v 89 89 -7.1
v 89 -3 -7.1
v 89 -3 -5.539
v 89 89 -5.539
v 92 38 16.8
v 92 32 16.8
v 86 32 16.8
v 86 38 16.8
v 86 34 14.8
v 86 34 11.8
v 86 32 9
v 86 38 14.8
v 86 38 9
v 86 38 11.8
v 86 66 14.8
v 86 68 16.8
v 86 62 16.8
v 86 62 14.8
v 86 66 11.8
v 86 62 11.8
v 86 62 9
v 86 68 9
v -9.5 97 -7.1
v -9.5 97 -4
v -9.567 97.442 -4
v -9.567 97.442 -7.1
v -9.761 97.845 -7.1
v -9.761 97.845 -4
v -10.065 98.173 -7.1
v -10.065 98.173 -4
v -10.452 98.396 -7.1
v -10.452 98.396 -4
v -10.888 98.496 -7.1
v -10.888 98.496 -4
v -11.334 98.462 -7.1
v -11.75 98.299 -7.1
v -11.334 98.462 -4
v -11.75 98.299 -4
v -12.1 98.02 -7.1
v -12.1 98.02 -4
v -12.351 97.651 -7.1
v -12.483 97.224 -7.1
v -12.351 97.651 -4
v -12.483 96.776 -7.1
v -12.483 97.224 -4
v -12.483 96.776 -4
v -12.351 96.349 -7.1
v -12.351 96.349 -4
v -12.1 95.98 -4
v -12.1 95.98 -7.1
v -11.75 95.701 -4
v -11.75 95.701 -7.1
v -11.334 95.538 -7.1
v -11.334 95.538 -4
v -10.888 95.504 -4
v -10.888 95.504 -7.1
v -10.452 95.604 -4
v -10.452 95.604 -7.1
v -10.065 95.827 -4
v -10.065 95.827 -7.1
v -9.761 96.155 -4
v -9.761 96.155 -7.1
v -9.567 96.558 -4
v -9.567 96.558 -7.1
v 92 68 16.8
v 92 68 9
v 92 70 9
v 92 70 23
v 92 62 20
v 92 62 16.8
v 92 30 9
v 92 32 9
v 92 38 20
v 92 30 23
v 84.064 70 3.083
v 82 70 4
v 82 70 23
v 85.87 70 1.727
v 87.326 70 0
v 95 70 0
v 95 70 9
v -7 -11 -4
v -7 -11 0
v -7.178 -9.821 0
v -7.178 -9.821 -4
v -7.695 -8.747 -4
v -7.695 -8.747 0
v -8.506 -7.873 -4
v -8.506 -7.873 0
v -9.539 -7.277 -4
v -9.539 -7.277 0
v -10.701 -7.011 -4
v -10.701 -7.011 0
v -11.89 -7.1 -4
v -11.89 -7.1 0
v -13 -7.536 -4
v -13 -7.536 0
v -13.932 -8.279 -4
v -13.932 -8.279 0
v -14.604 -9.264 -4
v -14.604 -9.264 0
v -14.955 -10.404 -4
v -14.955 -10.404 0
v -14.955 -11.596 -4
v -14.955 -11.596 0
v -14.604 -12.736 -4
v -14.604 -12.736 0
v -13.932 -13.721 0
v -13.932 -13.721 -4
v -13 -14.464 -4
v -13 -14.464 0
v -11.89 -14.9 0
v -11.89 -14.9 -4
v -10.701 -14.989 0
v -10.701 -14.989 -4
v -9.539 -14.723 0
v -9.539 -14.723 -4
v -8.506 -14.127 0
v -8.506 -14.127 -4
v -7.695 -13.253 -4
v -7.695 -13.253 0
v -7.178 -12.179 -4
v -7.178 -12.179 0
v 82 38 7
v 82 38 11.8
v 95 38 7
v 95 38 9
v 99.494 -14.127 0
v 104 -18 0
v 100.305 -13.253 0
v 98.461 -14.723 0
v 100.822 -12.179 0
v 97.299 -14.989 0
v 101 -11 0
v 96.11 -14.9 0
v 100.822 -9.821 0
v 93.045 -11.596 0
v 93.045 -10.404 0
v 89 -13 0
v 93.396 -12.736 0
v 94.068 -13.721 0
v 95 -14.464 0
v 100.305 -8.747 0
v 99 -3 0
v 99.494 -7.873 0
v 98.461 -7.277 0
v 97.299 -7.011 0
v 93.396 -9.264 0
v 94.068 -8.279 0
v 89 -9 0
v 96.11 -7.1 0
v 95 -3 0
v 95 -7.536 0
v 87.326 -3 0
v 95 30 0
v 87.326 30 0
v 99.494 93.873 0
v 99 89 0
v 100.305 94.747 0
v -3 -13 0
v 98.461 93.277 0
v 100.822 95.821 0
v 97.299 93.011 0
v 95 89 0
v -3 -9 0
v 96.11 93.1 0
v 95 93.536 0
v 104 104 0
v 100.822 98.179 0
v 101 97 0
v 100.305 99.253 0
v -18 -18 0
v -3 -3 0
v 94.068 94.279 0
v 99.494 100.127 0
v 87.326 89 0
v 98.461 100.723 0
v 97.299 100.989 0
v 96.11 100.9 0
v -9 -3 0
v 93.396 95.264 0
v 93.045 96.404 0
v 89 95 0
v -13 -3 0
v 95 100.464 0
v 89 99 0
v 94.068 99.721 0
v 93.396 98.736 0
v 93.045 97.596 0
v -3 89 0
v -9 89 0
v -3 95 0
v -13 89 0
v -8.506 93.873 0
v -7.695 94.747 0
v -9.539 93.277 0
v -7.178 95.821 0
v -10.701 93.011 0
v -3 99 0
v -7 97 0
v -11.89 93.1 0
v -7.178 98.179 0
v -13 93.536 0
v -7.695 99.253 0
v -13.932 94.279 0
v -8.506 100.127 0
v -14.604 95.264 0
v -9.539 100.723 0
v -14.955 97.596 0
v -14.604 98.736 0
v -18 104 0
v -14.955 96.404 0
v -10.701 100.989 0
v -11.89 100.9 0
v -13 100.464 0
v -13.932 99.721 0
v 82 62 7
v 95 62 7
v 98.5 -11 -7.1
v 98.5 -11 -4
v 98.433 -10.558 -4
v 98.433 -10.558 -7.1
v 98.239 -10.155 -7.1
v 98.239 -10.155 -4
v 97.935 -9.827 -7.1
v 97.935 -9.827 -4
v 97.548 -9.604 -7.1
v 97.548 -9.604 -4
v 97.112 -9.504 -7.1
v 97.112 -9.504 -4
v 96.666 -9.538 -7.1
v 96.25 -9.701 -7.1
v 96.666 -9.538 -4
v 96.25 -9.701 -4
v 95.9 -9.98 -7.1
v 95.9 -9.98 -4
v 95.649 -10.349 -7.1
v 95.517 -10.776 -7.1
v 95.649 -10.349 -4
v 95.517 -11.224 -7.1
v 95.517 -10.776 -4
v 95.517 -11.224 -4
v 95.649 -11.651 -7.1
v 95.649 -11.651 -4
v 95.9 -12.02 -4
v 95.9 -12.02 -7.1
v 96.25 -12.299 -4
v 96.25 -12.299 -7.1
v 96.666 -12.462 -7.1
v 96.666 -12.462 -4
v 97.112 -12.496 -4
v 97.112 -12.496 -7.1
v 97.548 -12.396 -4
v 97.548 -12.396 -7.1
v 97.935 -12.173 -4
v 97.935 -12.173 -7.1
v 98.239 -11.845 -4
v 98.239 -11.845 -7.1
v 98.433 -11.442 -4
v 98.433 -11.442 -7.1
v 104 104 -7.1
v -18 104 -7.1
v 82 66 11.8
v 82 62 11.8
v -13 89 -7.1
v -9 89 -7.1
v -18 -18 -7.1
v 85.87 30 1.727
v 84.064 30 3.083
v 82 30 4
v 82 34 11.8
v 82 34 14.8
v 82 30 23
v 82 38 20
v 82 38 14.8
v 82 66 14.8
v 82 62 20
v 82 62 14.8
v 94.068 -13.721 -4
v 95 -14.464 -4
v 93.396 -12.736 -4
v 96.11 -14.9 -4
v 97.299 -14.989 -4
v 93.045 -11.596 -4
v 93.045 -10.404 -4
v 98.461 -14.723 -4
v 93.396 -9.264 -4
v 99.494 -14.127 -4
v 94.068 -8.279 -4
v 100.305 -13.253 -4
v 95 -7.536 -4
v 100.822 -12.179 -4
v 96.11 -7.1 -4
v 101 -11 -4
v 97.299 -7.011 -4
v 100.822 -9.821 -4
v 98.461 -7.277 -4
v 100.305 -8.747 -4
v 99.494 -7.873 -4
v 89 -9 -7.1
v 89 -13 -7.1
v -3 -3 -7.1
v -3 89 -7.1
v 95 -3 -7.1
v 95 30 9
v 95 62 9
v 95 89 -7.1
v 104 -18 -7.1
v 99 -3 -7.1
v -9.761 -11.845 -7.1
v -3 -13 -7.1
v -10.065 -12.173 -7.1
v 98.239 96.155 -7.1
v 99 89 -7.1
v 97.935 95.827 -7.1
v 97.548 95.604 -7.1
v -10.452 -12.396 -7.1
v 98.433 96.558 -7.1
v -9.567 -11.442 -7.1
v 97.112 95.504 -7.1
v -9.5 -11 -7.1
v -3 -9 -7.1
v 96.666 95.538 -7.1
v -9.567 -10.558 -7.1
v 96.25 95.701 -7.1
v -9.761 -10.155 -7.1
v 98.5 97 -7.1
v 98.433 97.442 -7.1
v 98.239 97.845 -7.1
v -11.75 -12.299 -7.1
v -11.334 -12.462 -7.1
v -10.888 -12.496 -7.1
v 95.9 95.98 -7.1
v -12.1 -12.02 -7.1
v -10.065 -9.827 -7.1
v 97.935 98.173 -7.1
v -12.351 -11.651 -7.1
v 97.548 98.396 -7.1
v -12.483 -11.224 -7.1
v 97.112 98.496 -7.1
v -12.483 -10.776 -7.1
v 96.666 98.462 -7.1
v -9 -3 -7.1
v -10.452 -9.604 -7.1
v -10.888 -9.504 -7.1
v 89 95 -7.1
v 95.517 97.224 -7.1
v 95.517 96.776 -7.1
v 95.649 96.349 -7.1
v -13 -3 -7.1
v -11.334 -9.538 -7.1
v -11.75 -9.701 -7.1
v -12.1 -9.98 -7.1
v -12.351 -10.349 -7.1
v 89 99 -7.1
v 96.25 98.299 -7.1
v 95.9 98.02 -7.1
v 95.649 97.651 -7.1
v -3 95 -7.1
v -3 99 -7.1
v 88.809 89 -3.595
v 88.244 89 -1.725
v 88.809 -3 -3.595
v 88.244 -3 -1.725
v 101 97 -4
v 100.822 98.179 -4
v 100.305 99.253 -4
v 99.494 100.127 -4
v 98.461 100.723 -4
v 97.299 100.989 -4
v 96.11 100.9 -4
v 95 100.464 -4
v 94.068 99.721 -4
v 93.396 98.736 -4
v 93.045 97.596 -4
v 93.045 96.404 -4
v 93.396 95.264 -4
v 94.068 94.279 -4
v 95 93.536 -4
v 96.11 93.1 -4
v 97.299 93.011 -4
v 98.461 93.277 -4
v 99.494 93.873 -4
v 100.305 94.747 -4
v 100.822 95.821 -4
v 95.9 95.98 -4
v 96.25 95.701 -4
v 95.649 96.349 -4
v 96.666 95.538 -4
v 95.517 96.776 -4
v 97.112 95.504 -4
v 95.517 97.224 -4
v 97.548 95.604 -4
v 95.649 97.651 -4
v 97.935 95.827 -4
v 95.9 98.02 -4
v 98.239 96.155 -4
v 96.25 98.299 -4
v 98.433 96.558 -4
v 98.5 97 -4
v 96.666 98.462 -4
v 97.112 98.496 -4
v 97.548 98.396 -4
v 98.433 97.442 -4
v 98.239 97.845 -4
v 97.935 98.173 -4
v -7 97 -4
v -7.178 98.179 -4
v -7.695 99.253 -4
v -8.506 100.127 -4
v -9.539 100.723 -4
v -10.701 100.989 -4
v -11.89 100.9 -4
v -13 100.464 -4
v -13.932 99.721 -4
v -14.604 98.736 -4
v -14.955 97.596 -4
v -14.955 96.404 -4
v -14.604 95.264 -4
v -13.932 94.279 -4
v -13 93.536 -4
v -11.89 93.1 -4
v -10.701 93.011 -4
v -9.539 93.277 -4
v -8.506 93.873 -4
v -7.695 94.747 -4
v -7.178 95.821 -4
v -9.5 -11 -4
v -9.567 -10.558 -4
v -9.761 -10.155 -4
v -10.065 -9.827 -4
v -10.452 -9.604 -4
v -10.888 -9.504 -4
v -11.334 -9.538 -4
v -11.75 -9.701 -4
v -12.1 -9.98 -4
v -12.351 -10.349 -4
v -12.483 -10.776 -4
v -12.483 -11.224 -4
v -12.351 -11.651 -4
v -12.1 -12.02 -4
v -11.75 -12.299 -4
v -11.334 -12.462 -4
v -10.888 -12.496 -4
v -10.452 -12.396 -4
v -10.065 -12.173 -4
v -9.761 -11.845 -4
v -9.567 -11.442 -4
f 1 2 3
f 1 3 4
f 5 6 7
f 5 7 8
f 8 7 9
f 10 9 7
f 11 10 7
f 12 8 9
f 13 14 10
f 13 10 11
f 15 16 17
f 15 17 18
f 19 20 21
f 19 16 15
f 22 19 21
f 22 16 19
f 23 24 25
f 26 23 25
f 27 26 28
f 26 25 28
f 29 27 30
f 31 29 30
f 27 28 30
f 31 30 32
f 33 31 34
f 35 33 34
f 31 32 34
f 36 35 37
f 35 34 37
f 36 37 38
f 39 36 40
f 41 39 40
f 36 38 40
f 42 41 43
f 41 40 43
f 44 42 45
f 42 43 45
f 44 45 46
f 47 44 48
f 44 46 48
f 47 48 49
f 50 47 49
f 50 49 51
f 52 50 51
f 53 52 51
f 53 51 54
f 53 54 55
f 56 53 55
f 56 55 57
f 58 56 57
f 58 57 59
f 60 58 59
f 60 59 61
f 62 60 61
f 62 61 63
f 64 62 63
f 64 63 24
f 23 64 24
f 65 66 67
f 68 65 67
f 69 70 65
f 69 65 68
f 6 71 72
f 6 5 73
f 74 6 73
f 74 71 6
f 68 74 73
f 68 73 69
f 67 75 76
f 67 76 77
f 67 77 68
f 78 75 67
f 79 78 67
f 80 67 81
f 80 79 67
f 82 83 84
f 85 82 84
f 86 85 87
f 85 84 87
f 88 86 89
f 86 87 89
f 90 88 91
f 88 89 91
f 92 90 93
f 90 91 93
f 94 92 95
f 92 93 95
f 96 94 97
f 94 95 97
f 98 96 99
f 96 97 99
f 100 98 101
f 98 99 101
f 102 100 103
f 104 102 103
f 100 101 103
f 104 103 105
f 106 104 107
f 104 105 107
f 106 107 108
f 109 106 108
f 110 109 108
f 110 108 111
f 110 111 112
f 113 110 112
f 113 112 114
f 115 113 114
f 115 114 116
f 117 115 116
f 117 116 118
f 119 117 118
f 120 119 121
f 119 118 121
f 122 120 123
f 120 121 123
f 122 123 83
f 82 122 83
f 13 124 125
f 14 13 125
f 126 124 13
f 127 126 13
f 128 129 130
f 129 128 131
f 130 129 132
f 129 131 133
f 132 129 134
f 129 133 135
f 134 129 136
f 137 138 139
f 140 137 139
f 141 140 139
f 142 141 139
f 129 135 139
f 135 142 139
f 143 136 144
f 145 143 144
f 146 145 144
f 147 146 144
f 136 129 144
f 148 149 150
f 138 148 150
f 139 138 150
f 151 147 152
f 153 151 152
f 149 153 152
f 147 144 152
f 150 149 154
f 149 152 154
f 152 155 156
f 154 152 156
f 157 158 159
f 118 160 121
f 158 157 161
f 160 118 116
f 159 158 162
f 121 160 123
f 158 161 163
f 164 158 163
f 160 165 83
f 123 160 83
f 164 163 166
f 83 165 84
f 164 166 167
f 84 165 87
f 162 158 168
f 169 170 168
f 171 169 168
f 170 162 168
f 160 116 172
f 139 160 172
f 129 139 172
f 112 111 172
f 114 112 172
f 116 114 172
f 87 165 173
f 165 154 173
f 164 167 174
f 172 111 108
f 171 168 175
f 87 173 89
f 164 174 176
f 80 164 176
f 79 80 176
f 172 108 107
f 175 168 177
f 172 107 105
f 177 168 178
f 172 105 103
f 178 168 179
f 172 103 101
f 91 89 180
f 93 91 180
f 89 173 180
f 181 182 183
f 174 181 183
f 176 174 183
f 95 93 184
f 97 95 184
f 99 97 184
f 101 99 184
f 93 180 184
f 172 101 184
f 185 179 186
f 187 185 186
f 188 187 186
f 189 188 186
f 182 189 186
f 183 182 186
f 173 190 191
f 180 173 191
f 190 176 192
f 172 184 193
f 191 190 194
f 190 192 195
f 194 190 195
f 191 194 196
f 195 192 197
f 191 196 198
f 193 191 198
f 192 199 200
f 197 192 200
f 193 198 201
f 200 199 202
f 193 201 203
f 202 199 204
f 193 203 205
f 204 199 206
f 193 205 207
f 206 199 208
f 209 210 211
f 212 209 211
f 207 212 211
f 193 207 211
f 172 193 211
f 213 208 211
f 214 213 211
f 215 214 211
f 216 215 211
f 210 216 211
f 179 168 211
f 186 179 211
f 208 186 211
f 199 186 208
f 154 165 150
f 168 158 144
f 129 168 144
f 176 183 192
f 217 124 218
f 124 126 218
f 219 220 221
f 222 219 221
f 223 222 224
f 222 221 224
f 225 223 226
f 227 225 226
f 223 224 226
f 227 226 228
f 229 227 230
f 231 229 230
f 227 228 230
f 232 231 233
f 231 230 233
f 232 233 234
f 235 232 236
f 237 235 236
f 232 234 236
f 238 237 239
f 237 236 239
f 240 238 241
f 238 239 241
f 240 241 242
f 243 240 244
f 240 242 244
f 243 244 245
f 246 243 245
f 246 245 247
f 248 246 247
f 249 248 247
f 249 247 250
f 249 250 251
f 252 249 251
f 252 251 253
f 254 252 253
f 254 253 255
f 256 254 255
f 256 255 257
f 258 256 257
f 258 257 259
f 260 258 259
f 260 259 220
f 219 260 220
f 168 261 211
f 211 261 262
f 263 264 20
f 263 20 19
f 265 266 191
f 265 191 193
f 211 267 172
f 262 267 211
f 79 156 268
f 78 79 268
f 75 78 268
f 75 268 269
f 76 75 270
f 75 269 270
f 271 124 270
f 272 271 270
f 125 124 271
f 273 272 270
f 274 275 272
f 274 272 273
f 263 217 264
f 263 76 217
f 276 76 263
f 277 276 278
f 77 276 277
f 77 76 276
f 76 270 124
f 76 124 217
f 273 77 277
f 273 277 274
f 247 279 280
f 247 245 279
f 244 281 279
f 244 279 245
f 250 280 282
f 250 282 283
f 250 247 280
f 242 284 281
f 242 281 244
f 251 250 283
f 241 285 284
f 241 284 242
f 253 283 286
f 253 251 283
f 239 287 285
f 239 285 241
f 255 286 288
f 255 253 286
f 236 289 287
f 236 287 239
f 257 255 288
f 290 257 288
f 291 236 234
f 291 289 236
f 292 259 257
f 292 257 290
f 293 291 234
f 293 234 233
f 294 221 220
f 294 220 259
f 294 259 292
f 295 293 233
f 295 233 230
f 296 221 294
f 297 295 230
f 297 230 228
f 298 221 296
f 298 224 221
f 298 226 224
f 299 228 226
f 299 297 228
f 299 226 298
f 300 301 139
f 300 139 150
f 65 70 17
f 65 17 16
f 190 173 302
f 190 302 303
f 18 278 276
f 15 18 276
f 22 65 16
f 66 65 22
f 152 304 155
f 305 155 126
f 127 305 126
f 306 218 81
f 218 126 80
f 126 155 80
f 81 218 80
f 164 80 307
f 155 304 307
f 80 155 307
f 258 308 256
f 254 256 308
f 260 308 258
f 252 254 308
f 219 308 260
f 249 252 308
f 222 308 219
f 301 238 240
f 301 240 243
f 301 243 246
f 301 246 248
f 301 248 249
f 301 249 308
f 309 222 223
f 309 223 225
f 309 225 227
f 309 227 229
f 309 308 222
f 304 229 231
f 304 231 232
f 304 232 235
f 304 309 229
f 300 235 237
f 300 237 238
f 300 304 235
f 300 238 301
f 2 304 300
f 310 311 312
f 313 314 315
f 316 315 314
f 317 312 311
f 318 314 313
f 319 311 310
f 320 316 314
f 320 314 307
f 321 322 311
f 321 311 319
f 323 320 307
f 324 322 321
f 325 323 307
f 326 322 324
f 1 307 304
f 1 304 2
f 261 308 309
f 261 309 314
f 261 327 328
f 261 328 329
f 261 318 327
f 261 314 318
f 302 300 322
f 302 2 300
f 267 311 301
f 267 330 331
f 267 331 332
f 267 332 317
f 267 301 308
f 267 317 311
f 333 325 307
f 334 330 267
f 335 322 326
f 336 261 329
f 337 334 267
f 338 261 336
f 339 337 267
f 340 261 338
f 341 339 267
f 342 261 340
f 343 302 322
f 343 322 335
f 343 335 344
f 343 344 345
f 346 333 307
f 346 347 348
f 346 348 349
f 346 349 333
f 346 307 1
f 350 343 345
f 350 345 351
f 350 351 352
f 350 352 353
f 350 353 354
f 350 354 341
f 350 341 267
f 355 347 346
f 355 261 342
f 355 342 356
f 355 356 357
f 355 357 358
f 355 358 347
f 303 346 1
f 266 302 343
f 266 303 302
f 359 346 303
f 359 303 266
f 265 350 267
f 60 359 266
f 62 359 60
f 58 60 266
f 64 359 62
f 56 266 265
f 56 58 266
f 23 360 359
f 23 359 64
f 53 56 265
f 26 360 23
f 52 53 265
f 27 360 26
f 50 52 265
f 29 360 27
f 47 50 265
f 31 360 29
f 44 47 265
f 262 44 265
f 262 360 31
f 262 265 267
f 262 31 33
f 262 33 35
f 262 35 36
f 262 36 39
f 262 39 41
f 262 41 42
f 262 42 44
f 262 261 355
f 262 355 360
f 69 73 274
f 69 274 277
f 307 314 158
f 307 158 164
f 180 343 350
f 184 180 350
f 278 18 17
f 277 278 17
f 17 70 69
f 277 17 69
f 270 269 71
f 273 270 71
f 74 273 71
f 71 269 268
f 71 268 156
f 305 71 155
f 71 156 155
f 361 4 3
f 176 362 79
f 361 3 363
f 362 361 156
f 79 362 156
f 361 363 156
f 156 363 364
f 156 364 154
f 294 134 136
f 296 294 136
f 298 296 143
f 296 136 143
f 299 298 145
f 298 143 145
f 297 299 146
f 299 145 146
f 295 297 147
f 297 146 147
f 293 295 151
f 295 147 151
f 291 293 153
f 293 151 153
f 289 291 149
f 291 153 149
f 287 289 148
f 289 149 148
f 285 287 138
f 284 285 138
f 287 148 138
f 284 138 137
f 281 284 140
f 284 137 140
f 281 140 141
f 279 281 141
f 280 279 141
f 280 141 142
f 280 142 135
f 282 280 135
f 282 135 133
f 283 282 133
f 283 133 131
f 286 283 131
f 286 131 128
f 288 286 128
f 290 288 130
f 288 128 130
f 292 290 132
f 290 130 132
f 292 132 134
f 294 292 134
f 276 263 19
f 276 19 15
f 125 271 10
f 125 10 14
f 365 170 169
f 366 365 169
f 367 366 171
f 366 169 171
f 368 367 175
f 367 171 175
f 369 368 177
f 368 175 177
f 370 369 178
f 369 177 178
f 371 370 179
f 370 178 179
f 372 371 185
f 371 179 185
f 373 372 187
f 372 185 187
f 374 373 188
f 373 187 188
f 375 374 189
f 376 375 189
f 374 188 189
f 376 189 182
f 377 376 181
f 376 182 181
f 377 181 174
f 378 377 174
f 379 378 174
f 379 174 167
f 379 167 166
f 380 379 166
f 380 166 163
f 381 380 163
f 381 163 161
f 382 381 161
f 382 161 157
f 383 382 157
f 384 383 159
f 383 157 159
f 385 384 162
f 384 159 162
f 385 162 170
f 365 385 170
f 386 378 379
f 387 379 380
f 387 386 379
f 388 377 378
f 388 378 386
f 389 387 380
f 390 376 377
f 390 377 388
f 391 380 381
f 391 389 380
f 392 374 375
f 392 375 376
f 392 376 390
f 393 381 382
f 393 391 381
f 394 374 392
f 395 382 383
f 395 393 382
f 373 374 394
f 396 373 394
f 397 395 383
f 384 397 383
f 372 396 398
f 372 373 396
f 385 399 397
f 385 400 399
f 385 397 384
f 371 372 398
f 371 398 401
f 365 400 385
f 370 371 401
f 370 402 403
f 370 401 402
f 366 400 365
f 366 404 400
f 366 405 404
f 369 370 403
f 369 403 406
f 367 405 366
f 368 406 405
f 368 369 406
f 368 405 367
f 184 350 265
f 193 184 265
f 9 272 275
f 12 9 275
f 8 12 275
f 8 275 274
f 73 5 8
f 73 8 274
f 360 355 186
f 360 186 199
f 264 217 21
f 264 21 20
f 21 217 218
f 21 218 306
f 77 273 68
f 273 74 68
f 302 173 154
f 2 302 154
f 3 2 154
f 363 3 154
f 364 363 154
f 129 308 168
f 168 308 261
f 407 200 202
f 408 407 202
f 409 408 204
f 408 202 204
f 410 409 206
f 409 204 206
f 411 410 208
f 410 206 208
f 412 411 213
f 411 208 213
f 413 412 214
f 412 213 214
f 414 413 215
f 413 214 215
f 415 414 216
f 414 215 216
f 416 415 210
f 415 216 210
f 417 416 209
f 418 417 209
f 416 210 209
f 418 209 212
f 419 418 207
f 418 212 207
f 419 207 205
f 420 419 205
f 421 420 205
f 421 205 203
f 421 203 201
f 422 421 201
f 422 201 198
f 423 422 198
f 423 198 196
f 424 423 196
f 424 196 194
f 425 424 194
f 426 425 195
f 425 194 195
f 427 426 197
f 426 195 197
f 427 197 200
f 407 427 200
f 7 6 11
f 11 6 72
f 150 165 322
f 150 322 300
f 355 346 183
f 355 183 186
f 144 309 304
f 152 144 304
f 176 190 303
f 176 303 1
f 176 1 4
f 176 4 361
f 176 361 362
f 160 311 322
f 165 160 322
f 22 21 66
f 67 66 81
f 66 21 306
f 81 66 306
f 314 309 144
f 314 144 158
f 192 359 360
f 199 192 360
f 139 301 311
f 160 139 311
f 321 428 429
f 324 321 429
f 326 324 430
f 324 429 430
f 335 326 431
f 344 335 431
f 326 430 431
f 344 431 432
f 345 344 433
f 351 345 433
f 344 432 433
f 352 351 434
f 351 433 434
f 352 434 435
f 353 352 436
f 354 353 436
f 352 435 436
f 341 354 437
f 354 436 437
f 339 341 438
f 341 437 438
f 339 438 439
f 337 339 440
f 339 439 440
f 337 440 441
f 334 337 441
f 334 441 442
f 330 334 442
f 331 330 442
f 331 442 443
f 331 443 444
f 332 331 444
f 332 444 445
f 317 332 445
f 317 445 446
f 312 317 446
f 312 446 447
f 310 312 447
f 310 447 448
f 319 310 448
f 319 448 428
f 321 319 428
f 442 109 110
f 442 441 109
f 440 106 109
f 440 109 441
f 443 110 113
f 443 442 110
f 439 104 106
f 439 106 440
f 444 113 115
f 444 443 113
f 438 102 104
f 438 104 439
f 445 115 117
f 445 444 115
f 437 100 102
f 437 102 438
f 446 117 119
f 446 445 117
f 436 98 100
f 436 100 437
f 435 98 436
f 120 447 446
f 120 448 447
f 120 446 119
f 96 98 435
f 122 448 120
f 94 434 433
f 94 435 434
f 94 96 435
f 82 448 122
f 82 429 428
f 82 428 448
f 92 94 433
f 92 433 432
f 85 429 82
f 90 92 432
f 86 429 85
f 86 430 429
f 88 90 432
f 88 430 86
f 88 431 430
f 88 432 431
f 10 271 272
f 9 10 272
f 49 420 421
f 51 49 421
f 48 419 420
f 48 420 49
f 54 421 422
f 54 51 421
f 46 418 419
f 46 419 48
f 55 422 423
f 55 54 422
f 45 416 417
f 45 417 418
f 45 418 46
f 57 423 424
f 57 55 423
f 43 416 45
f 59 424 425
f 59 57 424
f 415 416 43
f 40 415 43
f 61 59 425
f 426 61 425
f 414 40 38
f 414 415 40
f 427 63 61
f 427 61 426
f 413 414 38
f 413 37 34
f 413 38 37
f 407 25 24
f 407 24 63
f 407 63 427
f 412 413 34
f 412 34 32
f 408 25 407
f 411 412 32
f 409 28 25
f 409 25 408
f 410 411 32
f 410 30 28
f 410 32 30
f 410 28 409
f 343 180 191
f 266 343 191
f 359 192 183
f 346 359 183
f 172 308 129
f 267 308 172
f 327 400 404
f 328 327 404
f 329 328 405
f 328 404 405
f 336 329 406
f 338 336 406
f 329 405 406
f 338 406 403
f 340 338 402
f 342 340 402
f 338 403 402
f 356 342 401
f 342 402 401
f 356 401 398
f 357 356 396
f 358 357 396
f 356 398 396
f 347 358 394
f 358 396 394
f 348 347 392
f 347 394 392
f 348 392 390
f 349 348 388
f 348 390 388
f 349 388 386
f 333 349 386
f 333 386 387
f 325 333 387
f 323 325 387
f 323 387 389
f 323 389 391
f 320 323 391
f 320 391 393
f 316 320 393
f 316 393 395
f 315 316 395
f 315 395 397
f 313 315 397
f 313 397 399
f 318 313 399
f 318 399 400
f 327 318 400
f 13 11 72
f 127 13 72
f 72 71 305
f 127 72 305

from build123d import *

# Parameters (mm, degrees)
SKETCH_1_W          = 104
SKETCH_1_H          = 104
SKETCH_1_W_2        = 92
SKETCH_1_H_2        = 92
EXTRUDE_1_DEPTH     = 7.1
SKETCH_2_W          = 6
SKETCH_2_H          = 40
EXTRUDE_2_DEPTH     = 7
SKETCH_3_W          = 6
SKETCH_3_H          = 8
EXTRUDE_3_DEPTH     = 13
SKETCH_4_W          = 6
SKETCH_4_H          = 40
EXTRUDE_4_DEPTH     = 3
SKETCH_5_W          = 3
SKETCH_5_H          = 14
CUT_EXTRUDE_1_DEPTH = 118.383985279
SKETCH_6_W          = 19
SKETCH_6_H          = 40
SKETCH_6_W_2        = 13
SKETCH_6_H_2        = 24
EXTRUDE_5_DEPTH     = 7
SKETCH_7_W          = 3
SKETCH_7_H          = 4
CUT_EXTRUDE_3_DEPTH = 134.547744271
SKETCH_8_W          = 7.8
SKETCH_8_H          = 6
CUT_EXTRUDE_4_DEPTH = 6
FILLET_START        = 30
FILLET_1_DEPTH      = 40
FILLET_START_2      = -4
FILLET_1_2_DEPTH    = 94
SKETCH_9_W          = 10
SKETCH_9_H          = 10
EXTRUDE_6_DEPTH     = 7.1
SKETCH_10_W         = 122
SKETCH_10_H         = 122
SKETCH_10_W_2       = 112
SKETCH_10_H_2       = 112
EXTRUDE_7_DEPTH     = 7.1
SKETCH_11_R         = 1.5
CUT_EXTRUDE_5_DEPTH = 149.865711297
SKETCH_12_R         = 4
CUT_EXTRUDE_6_DEPTH = 4


with BuildPart() as part:
    # 草图1 → 凸台-拉伸1 (new body)
    with BuildSketch(Plane.XY):
        with Locations((43, 43)):
            Rectangle(SKETCH_1_W, SKETCH_1_H)
        with Locations((43, 43)):
            Rectangle(SKETCH_1_W_2, SKETCH_1_H_2, mode=Mode.SUBTRACT)
    extrude(amount=-EXTRUDE_1_DEPTH)

    # 草图2 → 凸台-拉伸2 (add)
    with BuildSketch(Plane.XY):
        with Locations((92, 50)):
            Rectangle(SKETCH_2_W, SKETCH_2_H)
    extrude(amount=EXTRUDE_2_DEPTH)

    # 草图3 → 凸台-拉伸3 (add)
    with BuildSketch(Plane.XY.offset(7)):
        with Locations((92, 66)):
            Rectangle(SKETCH_3_W, SKETCH_3_H)
        with Locations((92, 34)):
            Rectangle(SKETCH_3_W, SKETCH_3_H)
    extrude(amount=EXTRUDE_3_DEPTH)

    # 草图4 → 凸台-拉伸4 (add)
    with BuildSketch(Plane.XY.offset(20)):
        with Locations((92, 50)):
            Rectangle(SKETCH_4_W, SKETCH_4_H)
    extrude(amount=EXTRUDE_4_DEPTH)

    # 草图5 → 切除-拉伸1 (cut, through all)
    with BuildSketch(Plane.XZ.offset(-30)):
        with Locations((93.5, 16)):
            Rectangle(SKETCH_5_W, SKETCH_5_H)
    extrude(amount=-CUT_EXTRUDE_1_DEPTH, mode=Mode.SUBTRACT)

    # 草图6 → 凸台-拉伸5 (add)
    with BuildSketch(Plane.ZY.offset(-89)):
        with Locations((13.5, 50)):
            Rectangle(SKETCH_6_W, SKETCH_6_H)
        with Locations((13.5, 50)):
            Rectangle(SKETCH_6_W_2, SKETCH_6_H_2, mode=Mode.SUBTRACT)
    extrude(amount=EXTRUDE_5_DEPTH)

    # 草图7 → 切除-拉伸3 (cut, through all)
    with BuildSketch(Plane.ZY.offset(-82)):
        with Locations((13.3, 64)):
            Rectangle(SKETCH_7_W, SKETCH_7_H)
        with Locations((13.3, 36)):
            Rectangle(SKETCH_7_W, SKETCH_7_H)
    extrude(amount=-CUT_EXTRUDE_3_DEPTH, mode=Mode.SUBTRACT)

    # 草图8 → 切除-拉伸4 (cut)
    with BuildSketch(Plane(origin=(92, 0, 0), x_dir=(0, 0, -1), z_dir=(1, 0, 0))):
        with Locations((-12.9, 65)):
            Rectangle(SKETCH_8_W, SKETCH_8_H)
        with Locations((-12.9, 35)):
            Rectangle(SKETCH_8_W, SKETCH_8_H)
    extrude(amount=-CUT_EXTRUDE_4_DEPTH, mode=Mode.SUBTRACT)

    # 圆角1: read off the stored shape, not the designer's step
    # 圆角1 outline → 圆角1 (add)
    with BuildSketch(Plane(origin=(0, 0, 0), x_dir=(1, 0, 0), z_dir=(0, 1, 0)).offset(FILLET_START)):
        with BuildLine():
            ThreePointArc((89, 5.539392014), (87.062257748, -0.376687769), (82, -4))
            Line((82, -4), (89, -4))
            Line((89, -4), (89, 5.539392014))
        make_face()
    extrude(amount=FILLET_1_DEPTH)

    # Fillet 1 2 outline → Fillet 1 2 (add)
    with BuildSketch(Plane(origin=(0, 0, 0), x_dir=(1, 0, 0), z_dir=(0, 1, 0)).offset(FILLET_START_2)):
        with BuildLine():
            Line((89, 0), (89, 5.539392014))
            ThreePointArc((89, 5.539392014), (88.572244047, 2.645926288), (87.325571218, 0))
            Line((87.325571218, 0), (89, 0))
        make_face()
    extrude(amount=FILLET_1_2_DEPTH)

    # 草图9 → 凸台-拉伸6 (add)
    with BuildSketch(Plane(origin=(0, 0, -7.1), x_dir=(-1, 0, 0), z_dir=(0, 0, -1))):
        with Locations((8, -8)):
            Rectangle(SKETCH_9_W, SKETCH_9_H)
        with Locations((-94, -8)):
            Rectangle(SKETCH_9_W, SKETCH_9_H)
        with Locations((8, 94)):
            Rectangle(SKETCH_9_W, SKETCH_9_H)
        with Locations((-94, 94)):
            Rectangle(SKETCH_9_W, SKETCH_9_H)
    extrude(amount=-EXTRUDE_6_DEPTH)

    # 草图10 → 凸台-拉伸7 (add)
    with BuildSketch(Plane(origin=(0, 0, -7.1), x_dir=(-1, 0, 0), z_dir=(0, 0, -1))):
        with Locations((-43, 43)):
            Rectangle(SKETCH_10_W, SKETCH_10_H)
        with Locations((-43, 43)):
            Rectangle(SKETCH_10_W_2, SKETCH_10_H_2, mode=Mode.SUBTRACT)
    extrude(amount=-EXTRUDE_7_DEPTH)

    # 草图11 → 切除-拉伸5 (cut, through all)
    with BuildSketch(Plane.XY):
        with Locations((-11, 97)):
            Circle(SKETCH_11_R)
        with Locations((-11, -11)):
            Circle(SKETCH_11_R)
        with Locations((97, 97)):
            Circle(SKETCH_11_R)
        with Locations((97, -11)):
            Circle(SKETCH_11_R)
    extrude(amount=-CUT_EXTRUDE_5_DEPTH, mode=Mode.SUBTRACT)

    # 草图12 → 切除-拉伸6 (cut)
    with BuildSketch(Plane.XY):
        with Locations((-11, 97)):
            Circle(SKETCH_12_R)
        with Locations((97, 97)):
            Circle(SKETCH_12_R)
        with Locations((-11, -11)):
            Circle(SKETCH_12_R)
        with Locations((97, -11)):
            Circle(SKETCH_12_R)
    extrude(amount=-CUT_EXTRUDE_6_DEPTH, mode=Mode.SUBTRACT)


solid = part.part
